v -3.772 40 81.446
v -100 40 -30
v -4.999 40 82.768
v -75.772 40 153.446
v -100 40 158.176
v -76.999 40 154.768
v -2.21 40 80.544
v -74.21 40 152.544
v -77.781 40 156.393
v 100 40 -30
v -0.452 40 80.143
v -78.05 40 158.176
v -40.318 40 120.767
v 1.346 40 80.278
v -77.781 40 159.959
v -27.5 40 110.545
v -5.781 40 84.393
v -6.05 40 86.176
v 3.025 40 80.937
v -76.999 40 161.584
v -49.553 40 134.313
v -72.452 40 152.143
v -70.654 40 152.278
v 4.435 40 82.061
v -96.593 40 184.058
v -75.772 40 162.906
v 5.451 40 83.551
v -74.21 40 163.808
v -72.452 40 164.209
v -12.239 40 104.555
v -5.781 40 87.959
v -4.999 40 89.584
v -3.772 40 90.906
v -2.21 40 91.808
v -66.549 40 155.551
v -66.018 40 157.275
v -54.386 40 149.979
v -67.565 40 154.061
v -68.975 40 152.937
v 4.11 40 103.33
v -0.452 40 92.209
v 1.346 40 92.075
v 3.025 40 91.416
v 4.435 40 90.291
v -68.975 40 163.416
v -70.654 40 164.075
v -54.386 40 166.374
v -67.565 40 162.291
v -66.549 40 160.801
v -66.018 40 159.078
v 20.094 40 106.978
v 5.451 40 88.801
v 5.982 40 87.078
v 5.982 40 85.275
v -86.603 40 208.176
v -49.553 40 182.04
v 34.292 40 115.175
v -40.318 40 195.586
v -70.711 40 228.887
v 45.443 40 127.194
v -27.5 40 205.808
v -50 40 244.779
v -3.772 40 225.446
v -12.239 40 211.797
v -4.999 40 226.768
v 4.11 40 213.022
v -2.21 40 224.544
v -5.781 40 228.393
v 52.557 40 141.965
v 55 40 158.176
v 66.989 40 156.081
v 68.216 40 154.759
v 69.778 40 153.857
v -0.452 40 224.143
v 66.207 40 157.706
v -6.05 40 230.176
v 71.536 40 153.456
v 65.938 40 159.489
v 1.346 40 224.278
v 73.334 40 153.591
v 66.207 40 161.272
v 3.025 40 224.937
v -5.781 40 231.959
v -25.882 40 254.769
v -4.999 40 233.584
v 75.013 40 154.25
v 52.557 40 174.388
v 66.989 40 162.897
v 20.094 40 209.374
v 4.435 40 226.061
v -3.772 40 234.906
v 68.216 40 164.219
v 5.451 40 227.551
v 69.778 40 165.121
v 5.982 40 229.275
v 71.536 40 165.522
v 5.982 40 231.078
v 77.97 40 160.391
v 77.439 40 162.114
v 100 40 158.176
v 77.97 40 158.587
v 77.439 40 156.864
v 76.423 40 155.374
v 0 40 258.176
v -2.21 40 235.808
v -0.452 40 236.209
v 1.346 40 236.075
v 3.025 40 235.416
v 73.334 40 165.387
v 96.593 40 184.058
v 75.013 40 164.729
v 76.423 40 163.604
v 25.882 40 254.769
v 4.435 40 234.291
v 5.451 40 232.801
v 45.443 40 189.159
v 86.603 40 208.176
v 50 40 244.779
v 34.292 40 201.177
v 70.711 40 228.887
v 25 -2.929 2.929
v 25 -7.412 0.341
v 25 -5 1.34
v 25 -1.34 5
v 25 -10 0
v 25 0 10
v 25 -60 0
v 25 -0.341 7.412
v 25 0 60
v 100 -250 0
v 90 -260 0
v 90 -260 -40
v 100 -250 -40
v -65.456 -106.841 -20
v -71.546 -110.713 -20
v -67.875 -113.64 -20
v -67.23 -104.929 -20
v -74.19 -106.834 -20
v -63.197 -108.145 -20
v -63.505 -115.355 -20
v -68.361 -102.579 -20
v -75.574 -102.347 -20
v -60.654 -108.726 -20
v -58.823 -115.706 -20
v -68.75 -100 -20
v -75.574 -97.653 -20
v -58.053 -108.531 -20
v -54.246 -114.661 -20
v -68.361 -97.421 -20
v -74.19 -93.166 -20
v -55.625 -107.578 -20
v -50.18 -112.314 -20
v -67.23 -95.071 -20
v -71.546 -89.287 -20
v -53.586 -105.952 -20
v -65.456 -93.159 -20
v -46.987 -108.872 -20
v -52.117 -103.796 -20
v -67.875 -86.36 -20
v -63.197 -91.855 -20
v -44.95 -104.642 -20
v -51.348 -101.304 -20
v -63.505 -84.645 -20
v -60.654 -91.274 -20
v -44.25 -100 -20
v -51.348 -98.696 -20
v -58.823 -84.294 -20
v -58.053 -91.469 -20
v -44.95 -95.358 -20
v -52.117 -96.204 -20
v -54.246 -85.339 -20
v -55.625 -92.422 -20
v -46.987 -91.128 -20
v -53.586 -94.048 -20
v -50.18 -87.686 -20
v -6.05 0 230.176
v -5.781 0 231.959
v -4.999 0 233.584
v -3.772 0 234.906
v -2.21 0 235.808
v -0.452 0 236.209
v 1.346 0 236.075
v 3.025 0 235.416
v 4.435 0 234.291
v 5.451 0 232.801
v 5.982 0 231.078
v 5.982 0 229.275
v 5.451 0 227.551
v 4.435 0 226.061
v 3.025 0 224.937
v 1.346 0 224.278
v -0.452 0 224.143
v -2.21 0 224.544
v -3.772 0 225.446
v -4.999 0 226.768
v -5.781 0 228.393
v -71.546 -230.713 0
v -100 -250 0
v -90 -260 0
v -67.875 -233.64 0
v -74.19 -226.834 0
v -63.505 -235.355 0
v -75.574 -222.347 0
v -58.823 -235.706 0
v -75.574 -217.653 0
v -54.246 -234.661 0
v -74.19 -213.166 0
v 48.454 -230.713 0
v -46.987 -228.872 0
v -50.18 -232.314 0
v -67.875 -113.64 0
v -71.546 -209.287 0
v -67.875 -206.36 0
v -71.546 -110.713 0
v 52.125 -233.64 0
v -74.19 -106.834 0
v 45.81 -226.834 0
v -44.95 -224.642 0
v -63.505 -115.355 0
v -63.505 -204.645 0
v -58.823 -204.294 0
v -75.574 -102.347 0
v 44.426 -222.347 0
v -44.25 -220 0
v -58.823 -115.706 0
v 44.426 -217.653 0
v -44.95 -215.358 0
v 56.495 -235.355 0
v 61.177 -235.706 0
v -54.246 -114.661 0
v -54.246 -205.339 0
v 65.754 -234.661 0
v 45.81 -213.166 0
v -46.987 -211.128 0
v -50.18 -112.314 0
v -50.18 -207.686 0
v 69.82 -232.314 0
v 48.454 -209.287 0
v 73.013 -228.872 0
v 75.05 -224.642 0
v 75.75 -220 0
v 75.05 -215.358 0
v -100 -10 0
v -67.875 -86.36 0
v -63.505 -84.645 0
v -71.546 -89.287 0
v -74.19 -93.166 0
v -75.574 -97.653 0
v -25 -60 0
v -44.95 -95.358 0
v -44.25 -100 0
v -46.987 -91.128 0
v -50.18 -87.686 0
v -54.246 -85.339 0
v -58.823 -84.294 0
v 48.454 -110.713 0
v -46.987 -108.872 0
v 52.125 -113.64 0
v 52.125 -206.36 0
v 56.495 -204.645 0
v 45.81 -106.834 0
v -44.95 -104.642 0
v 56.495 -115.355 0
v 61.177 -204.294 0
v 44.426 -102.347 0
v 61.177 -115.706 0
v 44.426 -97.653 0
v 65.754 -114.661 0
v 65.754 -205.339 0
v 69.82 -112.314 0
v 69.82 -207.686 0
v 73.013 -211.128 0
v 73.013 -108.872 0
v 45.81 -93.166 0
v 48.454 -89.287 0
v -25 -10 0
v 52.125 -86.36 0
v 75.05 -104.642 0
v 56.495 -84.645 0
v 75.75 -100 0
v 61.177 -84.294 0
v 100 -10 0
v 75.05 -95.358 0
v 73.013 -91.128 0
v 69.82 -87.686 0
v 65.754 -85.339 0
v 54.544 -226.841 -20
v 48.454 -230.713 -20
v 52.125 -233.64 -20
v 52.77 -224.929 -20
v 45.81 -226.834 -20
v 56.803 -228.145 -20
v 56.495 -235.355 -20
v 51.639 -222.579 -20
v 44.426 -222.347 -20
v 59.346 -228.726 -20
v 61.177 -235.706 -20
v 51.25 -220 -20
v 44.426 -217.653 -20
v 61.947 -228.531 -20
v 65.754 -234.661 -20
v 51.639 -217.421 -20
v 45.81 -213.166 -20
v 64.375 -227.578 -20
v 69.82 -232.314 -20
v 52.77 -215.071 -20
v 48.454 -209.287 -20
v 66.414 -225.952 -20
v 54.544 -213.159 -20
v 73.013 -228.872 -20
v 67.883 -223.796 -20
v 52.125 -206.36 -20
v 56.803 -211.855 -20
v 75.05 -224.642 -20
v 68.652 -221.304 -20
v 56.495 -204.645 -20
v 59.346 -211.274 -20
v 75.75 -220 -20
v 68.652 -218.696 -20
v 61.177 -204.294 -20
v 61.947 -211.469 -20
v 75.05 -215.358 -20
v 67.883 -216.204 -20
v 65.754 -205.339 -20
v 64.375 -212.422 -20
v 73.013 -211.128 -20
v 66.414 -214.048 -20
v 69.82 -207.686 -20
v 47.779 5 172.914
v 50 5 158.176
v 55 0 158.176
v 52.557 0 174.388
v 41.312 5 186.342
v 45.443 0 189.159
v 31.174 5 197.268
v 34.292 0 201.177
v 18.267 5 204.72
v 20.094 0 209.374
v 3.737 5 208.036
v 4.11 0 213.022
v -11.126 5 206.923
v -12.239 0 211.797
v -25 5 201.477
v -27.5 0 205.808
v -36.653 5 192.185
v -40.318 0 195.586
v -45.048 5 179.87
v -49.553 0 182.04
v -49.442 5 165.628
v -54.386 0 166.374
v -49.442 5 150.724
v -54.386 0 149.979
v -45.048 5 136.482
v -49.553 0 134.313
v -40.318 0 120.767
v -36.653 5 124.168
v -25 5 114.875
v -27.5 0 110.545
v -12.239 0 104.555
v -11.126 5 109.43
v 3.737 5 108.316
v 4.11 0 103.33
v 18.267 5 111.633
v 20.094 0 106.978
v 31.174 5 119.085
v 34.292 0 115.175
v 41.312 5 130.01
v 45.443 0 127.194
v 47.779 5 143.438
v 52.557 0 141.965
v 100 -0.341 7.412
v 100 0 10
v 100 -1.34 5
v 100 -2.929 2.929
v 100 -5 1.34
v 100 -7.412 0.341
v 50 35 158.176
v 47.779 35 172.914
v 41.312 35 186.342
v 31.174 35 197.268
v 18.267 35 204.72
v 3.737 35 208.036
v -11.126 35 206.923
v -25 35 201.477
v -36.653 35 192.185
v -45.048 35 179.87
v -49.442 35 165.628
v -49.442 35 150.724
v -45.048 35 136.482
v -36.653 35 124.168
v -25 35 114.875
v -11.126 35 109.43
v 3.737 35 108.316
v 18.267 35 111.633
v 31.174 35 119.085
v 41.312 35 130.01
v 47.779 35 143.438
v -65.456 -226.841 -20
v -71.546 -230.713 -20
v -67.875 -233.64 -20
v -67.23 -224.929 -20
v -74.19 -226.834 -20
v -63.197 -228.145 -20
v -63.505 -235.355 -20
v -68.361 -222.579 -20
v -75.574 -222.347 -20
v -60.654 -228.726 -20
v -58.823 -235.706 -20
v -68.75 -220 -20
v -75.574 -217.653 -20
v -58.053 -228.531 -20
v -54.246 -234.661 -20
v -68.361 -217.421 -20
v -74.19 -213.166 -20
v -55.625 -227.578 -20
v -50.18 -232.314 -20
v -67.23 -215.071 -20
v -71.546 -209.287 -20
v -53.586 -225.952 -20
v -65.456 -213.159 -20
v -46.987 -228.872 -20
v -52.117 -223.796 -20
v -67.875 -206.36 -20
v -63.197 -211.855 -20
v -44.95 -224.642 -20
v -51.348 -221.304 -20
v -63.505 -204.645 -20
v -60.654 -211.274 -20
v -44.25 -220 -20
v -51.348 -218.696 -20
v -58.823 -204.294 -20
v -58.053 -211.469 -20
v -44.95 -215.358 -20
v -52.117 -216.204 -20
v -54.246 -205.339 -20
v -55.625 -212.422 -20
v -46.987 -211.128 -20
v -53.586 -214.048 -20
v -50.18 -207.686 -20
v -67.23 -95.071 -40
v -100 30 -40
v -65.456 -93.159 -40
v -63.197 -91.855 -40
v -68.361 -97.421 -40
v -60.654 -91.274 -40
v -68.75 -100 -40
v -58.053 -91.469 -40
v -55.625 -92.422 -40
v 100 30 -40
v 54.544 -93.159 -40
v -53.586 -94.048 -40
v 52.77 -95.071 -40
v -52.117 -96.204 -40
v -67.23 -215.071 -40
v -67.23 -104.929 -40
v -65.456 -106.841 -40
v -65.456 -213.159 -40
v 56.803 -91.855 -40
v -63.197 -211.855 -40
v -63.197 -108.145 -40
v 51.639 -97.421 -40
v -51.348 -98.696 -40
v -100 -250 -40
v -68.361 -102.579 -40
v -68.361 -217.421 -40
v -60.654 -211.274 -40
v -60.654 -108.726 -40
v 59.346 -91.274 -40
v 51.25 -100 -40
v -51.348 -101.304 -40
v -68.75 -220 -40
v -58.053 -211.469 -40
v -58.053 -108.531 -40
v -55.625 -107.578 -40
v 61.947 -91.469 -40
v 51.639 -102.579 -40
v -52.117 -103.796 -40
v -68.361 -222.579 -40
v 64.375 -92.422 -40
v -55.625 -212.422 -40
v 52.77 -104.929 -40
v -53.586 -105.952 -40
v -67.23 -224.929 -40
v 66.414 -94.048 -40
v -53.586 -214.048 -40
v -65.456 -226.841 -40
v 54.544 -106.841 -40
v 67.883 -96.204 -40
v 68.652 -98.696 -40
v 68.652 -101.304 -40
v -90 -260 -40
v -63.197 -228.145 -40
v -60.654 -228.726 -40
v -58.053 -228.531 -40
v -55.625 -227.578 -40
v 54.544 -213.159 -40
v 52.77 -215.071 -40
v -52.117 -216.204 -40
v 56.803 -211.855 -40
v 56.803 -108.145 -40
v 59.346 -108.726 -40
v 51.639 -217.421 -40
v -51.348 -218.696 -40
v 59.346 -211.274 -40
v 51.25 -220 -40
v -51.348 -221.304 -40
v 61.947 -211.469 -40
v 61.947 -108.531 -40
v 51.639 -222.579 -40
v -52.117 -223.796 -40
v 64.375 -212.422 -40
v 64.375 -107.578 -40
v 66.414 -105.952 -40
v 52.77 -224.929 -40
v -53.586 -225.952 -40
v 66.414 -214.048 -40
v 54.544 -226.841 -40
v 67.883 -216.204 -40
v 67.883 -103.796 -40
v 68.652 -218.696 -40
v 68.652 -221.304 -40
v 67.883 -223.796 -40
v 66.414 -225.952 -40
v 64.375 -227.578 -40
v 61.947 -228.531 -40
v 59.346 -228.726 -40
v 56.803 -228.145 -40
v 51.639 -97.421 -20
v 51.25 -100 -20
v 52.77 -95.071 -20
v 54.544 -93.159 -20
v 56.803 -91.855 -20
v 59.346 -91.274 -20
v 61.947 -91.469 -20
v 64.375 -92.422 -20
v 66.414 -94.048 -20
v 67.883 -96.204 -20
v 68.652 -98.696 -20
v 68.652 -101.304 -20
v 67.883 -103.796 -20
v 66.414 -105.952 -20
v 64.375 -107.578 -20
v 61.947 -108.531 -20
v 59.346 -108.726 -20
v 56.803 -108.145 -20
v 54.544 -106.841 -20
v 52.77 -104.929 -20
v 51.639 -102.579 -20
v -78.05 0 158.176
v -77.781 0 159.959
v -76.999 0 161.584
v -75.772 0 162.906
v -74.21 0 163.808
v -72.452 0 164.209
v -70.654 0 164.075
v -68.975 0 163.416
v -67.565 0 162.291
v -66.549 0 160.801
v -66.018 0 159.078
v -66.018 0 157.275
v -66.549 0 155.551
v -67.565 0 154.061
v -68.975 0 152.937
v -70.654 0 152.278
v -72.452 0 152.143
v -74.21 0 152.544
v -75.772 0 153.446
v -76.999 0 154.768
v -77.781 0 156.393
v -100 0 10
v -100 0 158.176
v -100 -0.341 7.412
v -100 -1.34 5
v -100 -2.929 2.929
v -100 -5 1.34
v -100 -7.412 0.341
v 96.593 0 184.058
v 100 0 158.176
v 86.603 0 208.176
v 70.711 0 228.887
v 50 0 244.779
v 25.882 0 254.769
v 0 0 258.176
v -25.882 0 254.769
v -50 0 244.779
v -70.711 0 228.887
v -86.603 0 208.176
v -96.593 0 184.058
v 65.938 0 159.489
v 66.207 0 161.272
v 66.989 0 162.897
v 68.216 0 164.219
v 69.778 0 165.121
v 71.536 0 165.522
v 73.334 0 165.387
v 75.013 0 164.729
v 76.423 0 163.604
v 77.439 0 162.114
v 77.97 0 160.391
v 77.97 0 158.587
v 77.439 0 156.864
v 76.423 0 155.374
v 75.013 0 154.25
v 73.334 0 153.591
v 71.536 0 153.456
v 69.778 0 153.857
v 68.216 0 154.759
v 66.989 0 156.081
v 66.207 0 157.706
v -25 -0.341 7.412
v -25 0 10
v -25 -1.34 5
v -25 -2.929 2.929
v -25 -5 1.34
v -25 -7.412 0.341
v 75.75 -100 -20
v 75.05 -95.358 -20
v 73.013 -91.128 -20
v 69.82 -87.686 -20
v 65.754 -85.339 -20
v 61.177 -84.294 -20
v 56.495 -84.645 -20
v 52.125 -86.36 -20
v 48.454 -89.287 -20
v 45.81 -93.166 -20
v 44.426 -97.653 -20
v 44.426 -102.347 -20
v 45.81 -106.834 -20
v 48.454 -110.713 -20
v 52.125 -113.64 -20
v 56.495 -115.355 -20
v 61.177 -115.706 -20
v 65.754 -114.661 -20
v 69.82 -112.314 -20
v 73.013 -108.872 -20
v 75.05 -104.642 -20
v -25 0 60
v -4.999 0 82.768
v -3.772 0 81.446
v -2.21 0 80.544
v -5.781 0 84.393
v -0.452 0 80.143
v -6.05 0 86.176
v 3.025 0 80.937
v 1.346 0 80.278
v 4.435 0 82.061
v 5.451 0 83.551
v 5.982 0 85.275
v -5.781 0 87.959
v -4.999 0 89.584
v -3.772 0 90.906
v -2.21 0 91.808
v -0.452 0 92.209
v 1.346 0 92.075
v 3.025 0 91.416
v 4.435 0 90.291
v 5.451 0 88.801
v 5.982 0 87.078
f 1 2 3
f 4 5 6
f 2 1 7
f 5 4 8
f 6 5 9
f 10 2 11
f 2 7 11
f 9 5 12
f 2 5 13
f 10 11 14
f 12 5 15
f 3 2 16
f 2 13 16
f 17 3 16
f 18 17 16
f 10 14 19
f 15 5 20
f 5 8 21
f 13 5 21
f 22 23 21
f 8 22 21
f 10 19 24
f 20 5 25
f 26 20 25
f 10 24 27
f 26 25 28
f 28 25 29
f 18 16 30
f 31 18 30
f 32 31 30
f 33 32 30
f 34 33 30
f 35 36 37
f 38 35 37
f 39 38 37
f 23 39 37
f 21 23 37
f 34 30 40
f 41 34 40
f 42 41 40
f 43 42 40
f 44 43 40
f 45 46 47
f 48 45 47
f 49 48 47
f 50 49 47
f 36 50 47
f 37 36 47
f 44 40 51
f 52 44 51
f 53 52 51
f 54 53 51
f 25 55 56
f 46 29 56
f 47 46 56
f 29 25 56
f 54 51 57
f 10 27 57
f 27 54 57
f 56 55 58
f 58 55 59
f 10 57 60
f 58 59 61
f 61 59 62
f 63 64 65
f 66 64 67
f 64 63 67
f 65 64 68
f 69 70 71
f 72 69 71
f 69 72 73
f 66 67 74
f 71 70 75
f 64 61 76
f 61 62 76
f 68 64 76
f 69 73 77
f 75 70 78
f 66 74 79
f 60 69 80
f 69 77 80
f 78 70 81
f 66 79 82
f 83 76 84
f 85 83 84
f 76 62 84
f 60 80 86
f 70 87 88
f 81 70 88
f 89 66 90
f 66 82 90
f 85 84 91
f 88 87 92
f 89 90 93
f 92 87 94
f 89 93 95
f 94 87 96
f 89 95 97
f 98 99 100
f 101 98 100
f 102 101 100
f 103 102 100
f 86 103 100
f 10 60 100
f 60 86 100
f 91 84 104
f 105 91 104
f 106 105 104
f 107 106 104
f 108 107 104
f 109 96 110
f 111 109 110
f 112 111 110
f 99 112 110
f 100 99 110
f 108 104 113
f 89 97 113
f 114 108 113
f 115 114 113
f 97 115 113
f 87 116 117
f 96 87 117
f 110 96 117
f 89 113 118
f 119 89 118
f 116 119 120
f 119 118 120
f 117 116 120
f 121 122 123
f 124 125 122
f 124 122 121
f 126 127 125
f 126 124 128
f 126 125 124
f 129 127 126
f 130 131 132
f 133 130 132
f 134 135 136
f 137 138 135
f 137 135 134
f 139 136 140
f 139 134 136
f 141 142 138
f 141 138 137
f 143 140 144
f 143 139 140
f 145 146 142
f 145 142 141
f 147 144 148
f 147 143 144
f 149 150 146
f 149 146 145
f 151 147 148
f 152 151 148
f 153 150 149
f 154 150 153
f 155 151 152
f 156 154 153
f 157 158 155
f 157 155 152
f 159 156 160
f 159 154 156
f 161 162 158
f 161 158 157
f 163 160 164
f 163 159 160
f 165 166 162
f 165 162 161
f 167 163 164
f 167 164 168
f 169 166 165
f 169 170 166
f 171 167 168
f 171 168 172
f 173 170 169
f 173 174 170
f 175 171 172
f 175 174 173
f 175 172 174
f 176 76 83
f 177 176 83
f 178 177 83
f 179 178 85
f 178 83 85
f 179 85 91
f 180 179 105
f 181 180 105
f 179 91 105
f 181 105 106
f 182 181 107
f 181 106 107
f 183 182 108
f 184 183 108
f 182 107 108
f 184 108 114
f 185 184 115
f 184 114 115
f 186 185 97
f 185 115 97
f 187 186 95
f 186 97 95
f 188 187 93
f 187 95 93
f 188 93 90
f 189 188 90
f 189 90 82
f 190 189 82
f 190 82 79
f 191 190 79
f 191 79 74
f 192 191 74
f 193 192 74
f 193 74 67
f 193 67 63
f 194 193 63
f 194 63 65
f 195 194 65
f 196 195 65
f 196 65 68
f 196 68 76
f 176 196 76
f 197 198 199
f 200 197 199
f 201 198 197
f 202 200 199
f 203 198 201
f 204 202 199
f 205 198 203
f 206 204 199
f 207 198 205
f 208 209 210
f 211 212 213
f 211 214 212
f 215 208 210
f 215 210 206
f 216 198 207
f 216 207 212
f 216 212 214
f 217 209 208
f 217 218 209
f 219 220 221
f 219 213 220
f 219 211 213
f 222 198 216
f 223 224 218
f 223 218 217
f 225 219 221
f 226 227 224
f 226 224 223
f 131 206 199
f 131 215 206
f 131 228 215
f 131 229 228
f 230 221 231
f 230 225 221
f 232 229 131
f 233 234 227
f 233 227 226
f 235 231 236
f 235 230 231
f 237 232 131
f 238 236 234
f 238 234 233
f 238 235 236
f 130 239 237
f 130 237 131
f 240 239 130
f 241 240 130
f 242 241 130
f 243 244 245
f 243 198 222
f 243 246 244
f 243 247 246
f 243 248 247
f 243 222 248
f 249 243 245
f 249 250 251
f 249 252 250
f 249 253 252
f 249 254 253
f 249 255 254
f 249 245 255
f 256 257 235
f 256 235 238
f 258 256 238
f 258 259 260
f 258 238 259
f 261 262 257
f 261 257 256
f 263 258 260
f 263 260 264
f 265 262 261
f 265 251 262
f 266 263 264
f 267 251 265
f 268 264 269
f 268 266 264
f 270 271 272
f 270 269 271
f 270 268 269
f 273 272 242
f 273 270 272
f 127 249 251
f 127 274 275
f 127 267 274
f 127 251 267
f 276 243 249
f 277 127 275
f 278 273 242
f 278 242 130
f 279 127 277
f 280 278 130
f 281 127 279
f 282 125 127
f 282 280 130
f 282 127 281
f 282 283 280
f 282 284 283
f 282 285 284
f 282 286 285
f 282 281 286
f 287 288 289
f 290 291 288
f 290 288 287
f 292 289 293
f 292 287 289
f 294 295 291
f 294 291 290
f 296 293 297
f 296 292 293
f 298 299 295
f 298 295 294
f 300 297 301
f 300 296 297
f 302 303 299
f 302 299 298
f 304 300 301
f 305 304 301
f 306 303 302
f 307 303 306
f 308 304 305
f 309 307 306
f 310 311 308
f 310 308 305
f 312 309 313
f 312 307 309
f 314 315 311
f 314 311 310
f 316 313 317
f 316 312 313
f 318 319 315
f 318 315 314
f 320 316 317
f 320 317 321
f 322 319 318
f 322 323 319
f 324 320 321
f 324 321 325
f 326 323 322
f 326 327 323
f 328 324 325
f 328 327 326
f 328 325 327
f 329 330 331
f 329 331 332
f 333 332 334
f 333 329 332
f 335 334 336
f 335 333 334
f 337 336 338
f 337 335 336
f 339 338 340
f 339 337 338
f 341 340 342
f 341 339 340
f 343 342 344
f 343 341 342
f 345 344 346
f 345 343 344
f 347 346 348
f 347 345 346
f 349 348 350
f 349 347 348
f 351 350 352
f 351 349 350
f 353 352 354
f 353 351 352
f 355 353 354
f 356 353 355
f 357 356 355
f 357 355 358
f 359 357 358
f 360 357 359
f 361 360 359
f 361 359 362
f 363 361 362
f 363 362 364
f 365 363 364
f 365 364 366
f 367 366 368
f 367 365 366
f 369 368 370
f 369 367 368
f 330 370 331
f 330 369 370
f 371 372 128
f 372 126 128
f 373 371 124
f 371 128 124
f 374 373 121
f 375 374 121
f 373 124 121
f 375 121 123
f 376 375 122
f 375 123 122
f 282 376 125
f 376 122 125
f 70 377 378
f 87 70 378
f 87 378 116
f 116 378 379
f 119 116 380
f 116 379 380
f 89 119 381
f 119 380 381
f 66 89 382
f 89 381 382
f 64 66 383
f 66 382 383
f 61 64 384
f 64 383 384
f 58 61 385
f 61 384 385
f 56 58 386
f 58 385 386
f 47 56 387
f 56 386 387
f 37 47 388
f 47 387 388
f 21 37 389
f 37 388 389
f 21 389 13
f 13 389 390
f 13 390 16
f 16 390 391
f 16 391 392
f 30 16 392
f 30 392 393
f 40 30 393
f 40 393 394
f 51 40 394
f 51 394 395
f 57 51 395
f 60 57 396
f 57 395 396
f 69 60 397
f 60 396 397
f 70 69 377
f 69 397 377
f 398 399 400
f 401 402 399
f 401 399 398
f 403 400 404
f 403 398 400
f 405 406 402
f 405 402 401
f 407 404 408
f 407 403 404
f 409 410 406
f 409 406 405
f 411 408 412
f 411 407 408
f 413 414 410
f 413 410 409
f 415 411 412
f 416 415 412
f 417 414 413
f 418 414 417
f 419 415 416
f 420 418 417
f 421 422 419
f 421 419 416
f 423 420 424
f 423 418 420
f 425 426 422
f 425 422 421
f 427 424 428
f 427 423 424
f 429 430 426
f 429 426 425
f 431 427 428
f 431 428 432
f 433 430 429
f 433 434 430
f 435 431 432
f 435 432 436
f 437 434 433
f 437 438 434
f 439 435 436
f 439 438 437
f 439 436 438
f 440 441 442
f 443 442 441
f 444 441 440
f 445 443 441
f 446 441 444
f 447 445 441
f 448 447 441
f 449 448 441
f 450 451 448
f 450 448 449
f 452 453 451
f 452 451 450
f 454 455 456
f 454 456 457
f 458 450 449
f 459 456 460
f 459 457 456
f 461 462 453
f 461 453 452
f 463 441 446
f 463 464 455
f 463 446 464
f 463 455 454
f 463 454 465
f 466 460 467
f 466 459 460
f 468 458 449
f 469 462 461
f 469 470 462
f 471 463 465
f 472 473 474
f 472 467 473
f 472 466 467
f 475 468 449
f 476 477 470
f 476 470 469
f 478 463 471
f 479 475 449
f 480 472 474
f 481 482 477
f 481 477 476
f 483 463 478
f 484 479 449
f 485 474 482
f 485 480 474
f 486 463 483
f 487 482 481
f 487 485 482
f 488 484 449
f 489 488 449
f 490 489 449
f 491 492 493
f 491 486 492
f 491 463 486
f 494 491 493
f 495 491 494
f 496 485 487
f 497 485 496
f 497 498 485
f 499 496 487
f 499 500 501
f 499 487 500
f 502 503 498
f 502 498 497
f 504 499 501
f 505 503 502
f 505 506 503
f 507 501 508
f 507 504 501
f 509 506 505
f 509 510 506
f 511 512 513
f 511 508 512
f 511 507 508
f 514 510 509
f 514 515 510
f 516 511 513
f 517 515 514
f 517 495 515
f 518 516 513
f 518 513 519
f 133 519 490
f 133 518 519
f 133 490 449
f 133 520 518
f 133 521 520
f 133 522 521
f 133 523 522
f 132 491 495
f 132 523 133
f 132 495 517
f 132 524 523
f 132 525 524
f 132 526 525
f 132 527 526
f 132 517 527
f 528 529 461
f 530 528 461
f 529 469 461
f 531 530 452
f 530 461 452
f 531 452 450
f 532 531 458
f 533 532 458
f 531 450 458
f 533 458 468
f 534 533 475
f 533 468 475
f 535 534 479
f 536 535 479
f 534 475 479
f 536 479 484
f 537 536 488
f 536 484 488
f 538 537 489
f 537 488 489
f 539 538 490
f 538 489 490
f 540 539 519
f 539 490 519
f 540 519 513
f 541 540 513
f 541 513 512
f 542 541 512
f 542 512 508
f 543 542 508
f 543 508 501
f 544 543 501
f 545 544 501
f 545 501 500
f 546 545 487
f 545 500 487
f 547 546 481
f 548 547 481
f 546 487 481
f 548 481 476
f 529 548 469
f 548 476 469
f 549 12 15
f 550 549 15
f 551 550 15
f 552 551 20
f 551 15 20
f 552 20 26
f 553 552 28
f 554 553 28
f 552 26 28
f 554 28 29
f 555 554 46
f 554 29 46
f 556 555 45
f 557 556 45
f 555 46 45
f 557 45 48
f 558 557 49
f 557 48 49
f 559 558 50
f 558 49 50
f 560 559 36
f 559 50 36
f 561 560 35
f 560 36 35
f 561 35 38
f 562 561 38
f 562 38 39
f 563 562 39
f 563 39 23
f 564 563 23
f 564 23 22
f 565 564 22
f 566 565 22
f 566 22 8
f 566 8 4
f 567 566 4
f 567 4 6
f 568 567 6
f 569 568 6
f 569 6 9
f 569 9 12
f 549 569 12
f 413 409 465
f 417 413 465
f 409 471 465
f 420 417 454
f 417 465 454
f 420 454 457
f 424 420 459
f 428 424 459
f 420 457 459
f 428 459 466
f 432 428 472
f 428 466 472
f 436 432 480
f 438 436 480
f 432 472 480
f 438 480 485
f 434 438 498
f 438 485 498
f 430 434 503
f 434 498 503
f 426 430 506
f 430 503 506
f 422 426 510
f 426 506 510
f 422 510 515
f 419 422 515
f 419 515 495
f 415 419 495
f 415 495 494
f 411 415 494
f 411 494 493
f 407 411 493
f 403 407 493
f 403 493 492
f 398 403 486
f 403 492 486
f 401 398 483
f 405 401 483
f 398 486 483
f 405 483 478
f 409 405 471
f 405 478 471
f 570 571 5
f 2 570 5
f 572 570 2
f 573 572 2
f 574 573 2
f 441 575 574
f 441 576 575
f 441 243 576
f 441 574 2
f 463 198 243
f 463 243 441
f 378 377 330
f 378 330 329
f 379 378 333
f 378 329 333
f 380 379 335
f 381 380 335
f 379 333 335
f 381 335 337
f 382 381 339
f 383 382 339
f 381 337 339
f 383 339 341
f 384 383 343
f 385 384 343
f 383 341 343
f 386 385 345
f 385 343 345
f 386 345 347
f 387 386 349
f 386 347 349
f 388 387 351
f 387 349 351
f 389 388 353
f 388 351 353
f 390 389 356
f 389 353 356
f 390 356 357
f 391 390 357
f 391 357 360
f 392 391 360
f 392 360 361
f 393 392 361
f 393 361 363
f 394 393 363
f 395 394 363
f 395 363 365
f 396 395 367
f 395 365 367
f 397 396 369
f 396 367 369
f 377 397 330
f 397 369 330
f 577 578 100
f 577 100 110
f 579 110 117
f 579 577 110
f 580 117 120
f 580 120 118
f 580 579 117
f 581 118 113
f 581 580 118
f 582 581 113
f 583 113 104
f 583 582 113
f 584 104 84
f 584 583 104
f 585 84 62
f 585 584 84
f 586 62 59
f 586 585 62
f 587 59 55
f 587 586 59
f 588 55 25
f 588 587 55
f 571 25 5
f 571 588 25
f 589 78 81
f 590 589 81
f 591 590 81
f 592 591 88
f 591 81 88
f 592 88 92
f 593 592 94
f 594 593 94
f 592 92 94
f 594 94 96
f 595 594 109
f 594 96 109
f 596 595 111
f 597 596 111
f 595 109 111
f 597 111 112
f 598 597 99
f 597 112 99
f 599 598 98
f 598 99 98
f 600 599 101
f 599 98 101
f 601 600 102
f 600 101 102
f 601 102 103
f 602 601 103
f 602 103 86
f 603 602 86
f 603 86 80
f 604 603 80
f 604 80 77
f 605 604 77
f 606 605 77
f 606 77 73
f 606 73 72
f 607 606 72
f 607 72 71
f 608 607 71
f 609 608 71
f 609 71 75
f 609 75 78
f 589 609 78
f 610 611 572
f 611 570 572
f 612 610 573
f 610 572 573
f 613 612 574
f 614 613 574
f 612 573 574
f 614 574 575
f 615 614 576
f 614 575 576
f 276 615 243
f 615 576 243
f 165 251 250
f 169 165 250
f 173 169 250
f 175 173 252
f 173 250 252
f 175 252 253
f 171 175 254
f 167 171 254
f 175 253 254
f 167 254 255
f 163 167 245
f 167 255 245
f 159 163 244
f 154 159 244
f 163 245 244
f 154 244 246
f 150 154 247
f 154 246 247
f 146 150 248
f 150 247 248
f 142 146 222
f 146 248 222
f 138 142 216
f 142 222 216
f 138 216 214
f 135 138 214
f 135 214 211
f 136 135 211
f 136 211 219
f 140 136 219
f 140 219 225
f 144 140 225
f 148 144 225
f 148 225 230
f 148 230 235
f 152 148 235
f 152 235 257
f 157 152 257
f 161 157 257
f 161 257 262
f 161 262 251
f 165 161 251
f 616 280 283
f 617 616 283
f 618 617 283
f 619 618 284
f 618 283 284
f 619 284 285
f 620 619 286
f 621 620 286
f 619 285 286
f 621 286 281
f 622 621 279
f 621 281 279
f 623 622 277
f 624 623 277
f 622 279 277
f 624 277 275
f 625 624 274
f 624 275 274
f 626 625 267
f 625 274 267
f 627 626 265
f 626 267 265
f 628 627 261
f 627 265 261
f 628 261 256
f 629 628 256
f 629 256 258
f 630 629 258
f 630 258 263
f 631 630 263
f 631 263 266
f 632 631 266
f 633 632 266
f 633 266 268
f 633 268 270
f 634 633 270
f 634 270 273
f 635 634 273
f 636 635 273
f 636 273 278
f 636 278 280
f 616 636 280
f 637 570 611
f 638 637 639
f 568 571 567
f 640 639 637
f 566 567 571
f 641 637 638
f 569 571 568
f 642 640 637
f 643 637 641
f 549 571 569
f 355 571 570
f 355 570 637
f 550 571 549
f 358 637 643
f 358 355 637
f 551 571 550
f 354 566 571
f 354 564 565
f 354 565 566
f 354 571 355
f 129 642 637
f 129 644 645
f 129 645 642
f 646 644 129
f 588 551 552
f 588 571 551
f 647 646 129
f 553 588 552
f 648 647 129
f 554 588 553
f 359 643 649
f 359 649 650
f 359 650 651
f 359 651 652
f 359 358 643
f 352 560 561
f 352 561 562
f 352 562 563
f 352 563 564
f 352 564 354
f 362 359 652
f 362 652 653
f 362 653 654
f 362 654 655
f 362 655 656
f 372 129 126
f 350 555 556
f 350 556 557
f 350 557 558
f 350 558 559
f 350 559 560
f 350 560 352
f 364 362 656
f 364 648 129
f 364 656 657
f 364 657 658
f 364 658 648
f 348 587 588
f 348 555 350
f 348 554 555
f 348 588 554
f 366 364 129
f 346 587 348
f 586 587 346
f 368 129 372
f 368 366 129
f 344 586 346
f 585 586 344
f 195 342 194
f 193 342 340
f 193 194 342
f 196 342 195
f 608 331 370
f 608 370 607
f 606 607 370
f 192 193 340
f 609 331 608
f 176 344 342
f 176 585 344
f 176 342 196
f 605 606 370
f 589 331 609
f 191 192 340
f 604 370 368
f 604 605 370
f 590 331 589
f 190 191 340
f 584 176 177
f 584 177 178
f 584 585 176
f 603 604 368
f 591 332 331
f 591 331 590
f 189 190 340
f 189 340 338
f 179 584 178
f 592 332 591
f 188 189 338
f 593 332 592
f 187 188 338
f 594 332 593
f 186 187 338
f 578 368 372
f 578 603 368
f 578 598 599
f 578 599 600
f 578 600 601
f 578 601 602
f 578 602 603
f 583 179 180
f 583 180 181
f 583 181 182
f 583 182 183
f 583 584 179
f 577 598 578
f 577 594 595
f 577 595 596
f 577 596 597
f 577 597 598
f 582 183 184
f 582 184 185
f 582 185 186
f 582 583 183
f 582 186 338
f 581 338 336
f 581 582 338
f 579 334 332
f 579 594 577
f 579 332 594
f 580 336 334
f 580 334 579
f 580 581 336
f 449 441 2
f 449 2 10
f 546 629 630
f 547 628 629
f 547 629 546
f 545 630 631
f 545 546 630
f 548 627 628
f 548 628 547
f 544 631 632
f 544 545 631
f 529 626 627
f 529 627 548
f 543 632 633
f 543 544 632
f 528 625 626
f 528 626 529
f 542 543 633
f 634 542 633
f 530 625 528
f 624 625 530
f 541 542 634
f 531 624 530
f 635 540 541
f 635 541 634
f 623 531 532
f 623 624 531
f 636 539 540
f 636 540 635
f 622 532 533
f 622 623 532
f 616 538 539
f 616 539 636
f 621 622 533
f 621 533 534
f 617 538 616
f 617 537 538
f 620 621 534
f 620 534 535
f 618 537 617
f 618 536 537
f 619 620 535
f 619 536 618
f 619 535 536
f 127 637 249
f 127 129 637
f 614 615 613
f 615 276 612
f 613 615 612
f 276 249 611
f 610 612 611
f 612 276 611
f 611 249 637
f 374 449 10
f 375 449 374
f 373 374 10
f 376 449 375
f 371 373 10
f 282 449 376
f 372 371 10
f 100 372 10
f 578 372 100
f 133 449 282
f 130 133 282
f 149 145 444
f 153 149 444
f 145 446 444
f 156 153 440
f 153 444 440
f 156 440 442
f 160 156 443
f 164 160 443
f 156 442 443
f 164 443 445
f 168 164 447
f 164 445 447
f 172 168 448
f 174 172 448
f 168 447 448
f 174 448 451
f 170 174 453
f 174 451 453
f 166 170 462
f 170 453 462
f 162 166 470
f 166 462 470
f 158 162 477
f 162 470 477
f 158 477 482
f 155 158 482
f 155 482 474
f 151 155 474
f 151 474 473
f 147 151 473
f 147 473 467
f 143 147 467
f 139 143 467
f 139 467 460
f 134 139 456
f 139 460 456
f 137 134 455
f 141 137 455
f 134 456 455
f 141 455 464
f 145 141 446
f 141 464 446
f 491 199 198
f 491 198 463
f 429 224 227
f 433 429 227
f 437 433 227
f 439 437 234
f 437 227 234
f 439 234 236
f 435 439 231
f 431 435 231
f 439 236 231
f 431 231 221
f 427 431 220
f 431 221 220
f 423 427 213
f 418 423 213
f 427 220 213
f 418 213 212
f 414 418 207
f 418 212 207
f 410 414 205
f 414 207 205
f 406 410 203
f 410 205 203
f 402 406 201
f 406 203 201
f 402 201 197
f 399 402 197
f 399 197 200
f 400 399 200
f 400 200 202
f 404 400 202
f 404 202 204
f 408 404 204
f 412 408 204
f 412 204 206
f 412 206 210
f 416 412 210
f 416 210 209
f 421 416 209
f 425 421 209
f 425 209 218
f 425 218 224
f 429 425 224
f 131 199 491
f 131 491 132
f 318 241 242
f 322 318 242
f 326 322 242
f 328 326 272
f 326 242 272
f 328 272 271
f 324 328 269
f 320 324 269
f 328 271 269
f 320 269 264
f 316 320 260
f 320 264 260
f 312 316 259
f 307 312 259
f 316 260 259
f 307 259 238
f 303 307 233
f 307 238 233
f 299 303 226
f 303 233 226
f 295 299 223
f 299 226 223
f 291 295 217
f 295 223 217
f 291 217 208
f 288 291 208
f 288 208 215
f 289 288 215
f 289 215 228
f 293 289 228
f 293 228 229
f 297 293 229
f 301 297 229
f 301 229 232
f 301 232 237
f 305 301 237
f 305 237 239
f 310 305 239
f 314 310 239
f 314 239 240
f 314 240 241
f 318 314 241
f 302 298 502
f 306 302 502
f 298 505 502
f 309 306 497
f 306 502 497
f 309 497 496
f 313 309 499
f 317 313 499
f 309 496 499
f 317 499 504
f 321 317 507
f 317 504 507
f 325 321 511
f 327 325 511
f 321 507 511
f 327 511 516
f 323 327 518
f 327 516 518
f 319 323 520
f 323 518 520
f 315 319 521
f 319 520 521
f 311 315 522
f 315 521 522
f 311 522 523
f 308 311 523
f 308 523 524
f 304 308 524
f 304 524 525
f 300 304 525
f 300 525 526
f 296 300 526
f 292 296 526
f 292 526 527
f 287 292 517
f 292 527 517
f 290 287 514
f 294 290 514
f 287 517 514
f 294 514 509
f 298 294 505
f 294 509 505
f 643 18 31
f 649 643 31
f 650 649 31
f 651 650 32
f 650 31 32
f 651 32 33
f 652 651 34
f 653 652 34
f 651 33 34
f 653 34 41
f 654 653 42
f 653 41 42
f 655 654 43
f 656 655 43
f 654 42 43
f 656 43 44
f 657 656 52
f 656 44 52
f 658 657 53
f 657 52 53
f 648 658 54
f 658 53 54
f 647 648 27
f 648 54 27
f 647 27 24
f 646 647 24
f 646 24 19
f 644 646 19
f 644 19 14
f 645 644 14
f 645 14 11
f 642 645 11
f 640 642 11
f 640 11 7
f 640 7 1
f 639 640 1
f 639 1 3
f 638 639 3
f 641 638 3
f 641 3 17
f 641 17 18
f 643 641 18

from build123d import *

# Parameters (mm, degrees)
F0_R           = 50
F1_DEPTH       = 40
F2_D           = 12.1
F3_W           = 50
F3_H           = 100
F4_DEPTH       = 40
F5_D           = 17.5
F5_CBORE_D     = 31.5
F5_CBORE_DEPTH = 20
F7_DEPTH       = 25
F8_SIZE        = 5
F9_SIZE        = 10
F10_R          = 10


# Not quite as in the source:
# - a feature names something its author has since deleted; it is built from what else it names


with BuildPart() as f1:
    # F0 (on Front) → F1 (new body)
    with BuildSketch(Plane.XZ):
        with BuildLine():
            Line((-100, 158.1762170792), (-100, 0))
            Line((-100, 0), (100, 0))
            Line((100, 0), (100, 158.1762170792))
            ThreePointArc((100, 158.1762170792), (0, 58.1762170792), (-100, 158.1762170792))
        make_face()
        Polygon((-100, -40), (0, -40), (100, -40), (100, 0), (-100, 0), align=None)
        with BuildLine():
            ThreePointArc((100, 158.1762170792), (0, 258.1762170792), (-100, 158.1762170792))
            ThreePointArc((-100, 158.1762170792), (0, 58.1762170792), (100, 158.1762170792))
        make_face()
        with Locations((0, 158.1762170792)):
            Circle(F0_R, mode=Mode.SUBTRACT)
    extrude(amount=-F1_DEPTH)

    # F2 (through all)
    with Locations(Plane.XZ):
        with Locations((-72, 158.1762170792), (0, 230.1762170792), (71.9880287234, 159.4891224521), (0, 86.1762170792)):
            Hole(F2_D / 2)

    # F3 (on Top) → F4 (join)
    with BuildSketch(Plane.XY):
        Polygon((-25, 40), (-100, 40), (-100, -220), (-100, -260), (100, -260), (100, -220), (100, 40), (25, 40), (25, -60), (-25, -60), align=None)
        with Locations((0, -10)):
            Rectangle(F3_W, F3_H)
    extrude(amount=-F4_DEPTH)

    # F5 (through all)
    with Locations(Plane.XY):
        with Locations((-60, -100), (60, -100), (60, -220), (-60, -220)):
            CounterBoreHole(F5_D / 2, F5_CBORE_D / 2, F5_CBORE_DEPTH)

    # F6 (on Right) → F7 (join, symmetric)
    with BuildSketch(Plane.YZ):
        Polygon((-60, 0), (0, 0), (0, 60), align=None)
    extrude(amount=F7_DEPTH, both=True)

    # F8
    f8_edges = [f1.edges().sort_by_distance(p)[0] for p in [
        (-50, 0, 158.176217),
        (-50, 40, 158.176217),
    ]]
    chamfer(f8_edges, length=F8_SIZE)

    # F9
    f9_edges = [f1.edges().sort_by_distance(p)[0] for p in [
        (0, 40, -40),
        (-100, -260, -20),
        (100, -260, -20),
    ]]
    chamfer(f9_edges, length=F9_SIZE)

    # F10
    f10_edges = [f1.edges().sort_by_distance(p)[0] for p in [
        (-62.5, 0, 0),
        (62.5, 0, 0),
    ]]
    fillet(f10_edges, radius=F10_R)


solid = f1.part
